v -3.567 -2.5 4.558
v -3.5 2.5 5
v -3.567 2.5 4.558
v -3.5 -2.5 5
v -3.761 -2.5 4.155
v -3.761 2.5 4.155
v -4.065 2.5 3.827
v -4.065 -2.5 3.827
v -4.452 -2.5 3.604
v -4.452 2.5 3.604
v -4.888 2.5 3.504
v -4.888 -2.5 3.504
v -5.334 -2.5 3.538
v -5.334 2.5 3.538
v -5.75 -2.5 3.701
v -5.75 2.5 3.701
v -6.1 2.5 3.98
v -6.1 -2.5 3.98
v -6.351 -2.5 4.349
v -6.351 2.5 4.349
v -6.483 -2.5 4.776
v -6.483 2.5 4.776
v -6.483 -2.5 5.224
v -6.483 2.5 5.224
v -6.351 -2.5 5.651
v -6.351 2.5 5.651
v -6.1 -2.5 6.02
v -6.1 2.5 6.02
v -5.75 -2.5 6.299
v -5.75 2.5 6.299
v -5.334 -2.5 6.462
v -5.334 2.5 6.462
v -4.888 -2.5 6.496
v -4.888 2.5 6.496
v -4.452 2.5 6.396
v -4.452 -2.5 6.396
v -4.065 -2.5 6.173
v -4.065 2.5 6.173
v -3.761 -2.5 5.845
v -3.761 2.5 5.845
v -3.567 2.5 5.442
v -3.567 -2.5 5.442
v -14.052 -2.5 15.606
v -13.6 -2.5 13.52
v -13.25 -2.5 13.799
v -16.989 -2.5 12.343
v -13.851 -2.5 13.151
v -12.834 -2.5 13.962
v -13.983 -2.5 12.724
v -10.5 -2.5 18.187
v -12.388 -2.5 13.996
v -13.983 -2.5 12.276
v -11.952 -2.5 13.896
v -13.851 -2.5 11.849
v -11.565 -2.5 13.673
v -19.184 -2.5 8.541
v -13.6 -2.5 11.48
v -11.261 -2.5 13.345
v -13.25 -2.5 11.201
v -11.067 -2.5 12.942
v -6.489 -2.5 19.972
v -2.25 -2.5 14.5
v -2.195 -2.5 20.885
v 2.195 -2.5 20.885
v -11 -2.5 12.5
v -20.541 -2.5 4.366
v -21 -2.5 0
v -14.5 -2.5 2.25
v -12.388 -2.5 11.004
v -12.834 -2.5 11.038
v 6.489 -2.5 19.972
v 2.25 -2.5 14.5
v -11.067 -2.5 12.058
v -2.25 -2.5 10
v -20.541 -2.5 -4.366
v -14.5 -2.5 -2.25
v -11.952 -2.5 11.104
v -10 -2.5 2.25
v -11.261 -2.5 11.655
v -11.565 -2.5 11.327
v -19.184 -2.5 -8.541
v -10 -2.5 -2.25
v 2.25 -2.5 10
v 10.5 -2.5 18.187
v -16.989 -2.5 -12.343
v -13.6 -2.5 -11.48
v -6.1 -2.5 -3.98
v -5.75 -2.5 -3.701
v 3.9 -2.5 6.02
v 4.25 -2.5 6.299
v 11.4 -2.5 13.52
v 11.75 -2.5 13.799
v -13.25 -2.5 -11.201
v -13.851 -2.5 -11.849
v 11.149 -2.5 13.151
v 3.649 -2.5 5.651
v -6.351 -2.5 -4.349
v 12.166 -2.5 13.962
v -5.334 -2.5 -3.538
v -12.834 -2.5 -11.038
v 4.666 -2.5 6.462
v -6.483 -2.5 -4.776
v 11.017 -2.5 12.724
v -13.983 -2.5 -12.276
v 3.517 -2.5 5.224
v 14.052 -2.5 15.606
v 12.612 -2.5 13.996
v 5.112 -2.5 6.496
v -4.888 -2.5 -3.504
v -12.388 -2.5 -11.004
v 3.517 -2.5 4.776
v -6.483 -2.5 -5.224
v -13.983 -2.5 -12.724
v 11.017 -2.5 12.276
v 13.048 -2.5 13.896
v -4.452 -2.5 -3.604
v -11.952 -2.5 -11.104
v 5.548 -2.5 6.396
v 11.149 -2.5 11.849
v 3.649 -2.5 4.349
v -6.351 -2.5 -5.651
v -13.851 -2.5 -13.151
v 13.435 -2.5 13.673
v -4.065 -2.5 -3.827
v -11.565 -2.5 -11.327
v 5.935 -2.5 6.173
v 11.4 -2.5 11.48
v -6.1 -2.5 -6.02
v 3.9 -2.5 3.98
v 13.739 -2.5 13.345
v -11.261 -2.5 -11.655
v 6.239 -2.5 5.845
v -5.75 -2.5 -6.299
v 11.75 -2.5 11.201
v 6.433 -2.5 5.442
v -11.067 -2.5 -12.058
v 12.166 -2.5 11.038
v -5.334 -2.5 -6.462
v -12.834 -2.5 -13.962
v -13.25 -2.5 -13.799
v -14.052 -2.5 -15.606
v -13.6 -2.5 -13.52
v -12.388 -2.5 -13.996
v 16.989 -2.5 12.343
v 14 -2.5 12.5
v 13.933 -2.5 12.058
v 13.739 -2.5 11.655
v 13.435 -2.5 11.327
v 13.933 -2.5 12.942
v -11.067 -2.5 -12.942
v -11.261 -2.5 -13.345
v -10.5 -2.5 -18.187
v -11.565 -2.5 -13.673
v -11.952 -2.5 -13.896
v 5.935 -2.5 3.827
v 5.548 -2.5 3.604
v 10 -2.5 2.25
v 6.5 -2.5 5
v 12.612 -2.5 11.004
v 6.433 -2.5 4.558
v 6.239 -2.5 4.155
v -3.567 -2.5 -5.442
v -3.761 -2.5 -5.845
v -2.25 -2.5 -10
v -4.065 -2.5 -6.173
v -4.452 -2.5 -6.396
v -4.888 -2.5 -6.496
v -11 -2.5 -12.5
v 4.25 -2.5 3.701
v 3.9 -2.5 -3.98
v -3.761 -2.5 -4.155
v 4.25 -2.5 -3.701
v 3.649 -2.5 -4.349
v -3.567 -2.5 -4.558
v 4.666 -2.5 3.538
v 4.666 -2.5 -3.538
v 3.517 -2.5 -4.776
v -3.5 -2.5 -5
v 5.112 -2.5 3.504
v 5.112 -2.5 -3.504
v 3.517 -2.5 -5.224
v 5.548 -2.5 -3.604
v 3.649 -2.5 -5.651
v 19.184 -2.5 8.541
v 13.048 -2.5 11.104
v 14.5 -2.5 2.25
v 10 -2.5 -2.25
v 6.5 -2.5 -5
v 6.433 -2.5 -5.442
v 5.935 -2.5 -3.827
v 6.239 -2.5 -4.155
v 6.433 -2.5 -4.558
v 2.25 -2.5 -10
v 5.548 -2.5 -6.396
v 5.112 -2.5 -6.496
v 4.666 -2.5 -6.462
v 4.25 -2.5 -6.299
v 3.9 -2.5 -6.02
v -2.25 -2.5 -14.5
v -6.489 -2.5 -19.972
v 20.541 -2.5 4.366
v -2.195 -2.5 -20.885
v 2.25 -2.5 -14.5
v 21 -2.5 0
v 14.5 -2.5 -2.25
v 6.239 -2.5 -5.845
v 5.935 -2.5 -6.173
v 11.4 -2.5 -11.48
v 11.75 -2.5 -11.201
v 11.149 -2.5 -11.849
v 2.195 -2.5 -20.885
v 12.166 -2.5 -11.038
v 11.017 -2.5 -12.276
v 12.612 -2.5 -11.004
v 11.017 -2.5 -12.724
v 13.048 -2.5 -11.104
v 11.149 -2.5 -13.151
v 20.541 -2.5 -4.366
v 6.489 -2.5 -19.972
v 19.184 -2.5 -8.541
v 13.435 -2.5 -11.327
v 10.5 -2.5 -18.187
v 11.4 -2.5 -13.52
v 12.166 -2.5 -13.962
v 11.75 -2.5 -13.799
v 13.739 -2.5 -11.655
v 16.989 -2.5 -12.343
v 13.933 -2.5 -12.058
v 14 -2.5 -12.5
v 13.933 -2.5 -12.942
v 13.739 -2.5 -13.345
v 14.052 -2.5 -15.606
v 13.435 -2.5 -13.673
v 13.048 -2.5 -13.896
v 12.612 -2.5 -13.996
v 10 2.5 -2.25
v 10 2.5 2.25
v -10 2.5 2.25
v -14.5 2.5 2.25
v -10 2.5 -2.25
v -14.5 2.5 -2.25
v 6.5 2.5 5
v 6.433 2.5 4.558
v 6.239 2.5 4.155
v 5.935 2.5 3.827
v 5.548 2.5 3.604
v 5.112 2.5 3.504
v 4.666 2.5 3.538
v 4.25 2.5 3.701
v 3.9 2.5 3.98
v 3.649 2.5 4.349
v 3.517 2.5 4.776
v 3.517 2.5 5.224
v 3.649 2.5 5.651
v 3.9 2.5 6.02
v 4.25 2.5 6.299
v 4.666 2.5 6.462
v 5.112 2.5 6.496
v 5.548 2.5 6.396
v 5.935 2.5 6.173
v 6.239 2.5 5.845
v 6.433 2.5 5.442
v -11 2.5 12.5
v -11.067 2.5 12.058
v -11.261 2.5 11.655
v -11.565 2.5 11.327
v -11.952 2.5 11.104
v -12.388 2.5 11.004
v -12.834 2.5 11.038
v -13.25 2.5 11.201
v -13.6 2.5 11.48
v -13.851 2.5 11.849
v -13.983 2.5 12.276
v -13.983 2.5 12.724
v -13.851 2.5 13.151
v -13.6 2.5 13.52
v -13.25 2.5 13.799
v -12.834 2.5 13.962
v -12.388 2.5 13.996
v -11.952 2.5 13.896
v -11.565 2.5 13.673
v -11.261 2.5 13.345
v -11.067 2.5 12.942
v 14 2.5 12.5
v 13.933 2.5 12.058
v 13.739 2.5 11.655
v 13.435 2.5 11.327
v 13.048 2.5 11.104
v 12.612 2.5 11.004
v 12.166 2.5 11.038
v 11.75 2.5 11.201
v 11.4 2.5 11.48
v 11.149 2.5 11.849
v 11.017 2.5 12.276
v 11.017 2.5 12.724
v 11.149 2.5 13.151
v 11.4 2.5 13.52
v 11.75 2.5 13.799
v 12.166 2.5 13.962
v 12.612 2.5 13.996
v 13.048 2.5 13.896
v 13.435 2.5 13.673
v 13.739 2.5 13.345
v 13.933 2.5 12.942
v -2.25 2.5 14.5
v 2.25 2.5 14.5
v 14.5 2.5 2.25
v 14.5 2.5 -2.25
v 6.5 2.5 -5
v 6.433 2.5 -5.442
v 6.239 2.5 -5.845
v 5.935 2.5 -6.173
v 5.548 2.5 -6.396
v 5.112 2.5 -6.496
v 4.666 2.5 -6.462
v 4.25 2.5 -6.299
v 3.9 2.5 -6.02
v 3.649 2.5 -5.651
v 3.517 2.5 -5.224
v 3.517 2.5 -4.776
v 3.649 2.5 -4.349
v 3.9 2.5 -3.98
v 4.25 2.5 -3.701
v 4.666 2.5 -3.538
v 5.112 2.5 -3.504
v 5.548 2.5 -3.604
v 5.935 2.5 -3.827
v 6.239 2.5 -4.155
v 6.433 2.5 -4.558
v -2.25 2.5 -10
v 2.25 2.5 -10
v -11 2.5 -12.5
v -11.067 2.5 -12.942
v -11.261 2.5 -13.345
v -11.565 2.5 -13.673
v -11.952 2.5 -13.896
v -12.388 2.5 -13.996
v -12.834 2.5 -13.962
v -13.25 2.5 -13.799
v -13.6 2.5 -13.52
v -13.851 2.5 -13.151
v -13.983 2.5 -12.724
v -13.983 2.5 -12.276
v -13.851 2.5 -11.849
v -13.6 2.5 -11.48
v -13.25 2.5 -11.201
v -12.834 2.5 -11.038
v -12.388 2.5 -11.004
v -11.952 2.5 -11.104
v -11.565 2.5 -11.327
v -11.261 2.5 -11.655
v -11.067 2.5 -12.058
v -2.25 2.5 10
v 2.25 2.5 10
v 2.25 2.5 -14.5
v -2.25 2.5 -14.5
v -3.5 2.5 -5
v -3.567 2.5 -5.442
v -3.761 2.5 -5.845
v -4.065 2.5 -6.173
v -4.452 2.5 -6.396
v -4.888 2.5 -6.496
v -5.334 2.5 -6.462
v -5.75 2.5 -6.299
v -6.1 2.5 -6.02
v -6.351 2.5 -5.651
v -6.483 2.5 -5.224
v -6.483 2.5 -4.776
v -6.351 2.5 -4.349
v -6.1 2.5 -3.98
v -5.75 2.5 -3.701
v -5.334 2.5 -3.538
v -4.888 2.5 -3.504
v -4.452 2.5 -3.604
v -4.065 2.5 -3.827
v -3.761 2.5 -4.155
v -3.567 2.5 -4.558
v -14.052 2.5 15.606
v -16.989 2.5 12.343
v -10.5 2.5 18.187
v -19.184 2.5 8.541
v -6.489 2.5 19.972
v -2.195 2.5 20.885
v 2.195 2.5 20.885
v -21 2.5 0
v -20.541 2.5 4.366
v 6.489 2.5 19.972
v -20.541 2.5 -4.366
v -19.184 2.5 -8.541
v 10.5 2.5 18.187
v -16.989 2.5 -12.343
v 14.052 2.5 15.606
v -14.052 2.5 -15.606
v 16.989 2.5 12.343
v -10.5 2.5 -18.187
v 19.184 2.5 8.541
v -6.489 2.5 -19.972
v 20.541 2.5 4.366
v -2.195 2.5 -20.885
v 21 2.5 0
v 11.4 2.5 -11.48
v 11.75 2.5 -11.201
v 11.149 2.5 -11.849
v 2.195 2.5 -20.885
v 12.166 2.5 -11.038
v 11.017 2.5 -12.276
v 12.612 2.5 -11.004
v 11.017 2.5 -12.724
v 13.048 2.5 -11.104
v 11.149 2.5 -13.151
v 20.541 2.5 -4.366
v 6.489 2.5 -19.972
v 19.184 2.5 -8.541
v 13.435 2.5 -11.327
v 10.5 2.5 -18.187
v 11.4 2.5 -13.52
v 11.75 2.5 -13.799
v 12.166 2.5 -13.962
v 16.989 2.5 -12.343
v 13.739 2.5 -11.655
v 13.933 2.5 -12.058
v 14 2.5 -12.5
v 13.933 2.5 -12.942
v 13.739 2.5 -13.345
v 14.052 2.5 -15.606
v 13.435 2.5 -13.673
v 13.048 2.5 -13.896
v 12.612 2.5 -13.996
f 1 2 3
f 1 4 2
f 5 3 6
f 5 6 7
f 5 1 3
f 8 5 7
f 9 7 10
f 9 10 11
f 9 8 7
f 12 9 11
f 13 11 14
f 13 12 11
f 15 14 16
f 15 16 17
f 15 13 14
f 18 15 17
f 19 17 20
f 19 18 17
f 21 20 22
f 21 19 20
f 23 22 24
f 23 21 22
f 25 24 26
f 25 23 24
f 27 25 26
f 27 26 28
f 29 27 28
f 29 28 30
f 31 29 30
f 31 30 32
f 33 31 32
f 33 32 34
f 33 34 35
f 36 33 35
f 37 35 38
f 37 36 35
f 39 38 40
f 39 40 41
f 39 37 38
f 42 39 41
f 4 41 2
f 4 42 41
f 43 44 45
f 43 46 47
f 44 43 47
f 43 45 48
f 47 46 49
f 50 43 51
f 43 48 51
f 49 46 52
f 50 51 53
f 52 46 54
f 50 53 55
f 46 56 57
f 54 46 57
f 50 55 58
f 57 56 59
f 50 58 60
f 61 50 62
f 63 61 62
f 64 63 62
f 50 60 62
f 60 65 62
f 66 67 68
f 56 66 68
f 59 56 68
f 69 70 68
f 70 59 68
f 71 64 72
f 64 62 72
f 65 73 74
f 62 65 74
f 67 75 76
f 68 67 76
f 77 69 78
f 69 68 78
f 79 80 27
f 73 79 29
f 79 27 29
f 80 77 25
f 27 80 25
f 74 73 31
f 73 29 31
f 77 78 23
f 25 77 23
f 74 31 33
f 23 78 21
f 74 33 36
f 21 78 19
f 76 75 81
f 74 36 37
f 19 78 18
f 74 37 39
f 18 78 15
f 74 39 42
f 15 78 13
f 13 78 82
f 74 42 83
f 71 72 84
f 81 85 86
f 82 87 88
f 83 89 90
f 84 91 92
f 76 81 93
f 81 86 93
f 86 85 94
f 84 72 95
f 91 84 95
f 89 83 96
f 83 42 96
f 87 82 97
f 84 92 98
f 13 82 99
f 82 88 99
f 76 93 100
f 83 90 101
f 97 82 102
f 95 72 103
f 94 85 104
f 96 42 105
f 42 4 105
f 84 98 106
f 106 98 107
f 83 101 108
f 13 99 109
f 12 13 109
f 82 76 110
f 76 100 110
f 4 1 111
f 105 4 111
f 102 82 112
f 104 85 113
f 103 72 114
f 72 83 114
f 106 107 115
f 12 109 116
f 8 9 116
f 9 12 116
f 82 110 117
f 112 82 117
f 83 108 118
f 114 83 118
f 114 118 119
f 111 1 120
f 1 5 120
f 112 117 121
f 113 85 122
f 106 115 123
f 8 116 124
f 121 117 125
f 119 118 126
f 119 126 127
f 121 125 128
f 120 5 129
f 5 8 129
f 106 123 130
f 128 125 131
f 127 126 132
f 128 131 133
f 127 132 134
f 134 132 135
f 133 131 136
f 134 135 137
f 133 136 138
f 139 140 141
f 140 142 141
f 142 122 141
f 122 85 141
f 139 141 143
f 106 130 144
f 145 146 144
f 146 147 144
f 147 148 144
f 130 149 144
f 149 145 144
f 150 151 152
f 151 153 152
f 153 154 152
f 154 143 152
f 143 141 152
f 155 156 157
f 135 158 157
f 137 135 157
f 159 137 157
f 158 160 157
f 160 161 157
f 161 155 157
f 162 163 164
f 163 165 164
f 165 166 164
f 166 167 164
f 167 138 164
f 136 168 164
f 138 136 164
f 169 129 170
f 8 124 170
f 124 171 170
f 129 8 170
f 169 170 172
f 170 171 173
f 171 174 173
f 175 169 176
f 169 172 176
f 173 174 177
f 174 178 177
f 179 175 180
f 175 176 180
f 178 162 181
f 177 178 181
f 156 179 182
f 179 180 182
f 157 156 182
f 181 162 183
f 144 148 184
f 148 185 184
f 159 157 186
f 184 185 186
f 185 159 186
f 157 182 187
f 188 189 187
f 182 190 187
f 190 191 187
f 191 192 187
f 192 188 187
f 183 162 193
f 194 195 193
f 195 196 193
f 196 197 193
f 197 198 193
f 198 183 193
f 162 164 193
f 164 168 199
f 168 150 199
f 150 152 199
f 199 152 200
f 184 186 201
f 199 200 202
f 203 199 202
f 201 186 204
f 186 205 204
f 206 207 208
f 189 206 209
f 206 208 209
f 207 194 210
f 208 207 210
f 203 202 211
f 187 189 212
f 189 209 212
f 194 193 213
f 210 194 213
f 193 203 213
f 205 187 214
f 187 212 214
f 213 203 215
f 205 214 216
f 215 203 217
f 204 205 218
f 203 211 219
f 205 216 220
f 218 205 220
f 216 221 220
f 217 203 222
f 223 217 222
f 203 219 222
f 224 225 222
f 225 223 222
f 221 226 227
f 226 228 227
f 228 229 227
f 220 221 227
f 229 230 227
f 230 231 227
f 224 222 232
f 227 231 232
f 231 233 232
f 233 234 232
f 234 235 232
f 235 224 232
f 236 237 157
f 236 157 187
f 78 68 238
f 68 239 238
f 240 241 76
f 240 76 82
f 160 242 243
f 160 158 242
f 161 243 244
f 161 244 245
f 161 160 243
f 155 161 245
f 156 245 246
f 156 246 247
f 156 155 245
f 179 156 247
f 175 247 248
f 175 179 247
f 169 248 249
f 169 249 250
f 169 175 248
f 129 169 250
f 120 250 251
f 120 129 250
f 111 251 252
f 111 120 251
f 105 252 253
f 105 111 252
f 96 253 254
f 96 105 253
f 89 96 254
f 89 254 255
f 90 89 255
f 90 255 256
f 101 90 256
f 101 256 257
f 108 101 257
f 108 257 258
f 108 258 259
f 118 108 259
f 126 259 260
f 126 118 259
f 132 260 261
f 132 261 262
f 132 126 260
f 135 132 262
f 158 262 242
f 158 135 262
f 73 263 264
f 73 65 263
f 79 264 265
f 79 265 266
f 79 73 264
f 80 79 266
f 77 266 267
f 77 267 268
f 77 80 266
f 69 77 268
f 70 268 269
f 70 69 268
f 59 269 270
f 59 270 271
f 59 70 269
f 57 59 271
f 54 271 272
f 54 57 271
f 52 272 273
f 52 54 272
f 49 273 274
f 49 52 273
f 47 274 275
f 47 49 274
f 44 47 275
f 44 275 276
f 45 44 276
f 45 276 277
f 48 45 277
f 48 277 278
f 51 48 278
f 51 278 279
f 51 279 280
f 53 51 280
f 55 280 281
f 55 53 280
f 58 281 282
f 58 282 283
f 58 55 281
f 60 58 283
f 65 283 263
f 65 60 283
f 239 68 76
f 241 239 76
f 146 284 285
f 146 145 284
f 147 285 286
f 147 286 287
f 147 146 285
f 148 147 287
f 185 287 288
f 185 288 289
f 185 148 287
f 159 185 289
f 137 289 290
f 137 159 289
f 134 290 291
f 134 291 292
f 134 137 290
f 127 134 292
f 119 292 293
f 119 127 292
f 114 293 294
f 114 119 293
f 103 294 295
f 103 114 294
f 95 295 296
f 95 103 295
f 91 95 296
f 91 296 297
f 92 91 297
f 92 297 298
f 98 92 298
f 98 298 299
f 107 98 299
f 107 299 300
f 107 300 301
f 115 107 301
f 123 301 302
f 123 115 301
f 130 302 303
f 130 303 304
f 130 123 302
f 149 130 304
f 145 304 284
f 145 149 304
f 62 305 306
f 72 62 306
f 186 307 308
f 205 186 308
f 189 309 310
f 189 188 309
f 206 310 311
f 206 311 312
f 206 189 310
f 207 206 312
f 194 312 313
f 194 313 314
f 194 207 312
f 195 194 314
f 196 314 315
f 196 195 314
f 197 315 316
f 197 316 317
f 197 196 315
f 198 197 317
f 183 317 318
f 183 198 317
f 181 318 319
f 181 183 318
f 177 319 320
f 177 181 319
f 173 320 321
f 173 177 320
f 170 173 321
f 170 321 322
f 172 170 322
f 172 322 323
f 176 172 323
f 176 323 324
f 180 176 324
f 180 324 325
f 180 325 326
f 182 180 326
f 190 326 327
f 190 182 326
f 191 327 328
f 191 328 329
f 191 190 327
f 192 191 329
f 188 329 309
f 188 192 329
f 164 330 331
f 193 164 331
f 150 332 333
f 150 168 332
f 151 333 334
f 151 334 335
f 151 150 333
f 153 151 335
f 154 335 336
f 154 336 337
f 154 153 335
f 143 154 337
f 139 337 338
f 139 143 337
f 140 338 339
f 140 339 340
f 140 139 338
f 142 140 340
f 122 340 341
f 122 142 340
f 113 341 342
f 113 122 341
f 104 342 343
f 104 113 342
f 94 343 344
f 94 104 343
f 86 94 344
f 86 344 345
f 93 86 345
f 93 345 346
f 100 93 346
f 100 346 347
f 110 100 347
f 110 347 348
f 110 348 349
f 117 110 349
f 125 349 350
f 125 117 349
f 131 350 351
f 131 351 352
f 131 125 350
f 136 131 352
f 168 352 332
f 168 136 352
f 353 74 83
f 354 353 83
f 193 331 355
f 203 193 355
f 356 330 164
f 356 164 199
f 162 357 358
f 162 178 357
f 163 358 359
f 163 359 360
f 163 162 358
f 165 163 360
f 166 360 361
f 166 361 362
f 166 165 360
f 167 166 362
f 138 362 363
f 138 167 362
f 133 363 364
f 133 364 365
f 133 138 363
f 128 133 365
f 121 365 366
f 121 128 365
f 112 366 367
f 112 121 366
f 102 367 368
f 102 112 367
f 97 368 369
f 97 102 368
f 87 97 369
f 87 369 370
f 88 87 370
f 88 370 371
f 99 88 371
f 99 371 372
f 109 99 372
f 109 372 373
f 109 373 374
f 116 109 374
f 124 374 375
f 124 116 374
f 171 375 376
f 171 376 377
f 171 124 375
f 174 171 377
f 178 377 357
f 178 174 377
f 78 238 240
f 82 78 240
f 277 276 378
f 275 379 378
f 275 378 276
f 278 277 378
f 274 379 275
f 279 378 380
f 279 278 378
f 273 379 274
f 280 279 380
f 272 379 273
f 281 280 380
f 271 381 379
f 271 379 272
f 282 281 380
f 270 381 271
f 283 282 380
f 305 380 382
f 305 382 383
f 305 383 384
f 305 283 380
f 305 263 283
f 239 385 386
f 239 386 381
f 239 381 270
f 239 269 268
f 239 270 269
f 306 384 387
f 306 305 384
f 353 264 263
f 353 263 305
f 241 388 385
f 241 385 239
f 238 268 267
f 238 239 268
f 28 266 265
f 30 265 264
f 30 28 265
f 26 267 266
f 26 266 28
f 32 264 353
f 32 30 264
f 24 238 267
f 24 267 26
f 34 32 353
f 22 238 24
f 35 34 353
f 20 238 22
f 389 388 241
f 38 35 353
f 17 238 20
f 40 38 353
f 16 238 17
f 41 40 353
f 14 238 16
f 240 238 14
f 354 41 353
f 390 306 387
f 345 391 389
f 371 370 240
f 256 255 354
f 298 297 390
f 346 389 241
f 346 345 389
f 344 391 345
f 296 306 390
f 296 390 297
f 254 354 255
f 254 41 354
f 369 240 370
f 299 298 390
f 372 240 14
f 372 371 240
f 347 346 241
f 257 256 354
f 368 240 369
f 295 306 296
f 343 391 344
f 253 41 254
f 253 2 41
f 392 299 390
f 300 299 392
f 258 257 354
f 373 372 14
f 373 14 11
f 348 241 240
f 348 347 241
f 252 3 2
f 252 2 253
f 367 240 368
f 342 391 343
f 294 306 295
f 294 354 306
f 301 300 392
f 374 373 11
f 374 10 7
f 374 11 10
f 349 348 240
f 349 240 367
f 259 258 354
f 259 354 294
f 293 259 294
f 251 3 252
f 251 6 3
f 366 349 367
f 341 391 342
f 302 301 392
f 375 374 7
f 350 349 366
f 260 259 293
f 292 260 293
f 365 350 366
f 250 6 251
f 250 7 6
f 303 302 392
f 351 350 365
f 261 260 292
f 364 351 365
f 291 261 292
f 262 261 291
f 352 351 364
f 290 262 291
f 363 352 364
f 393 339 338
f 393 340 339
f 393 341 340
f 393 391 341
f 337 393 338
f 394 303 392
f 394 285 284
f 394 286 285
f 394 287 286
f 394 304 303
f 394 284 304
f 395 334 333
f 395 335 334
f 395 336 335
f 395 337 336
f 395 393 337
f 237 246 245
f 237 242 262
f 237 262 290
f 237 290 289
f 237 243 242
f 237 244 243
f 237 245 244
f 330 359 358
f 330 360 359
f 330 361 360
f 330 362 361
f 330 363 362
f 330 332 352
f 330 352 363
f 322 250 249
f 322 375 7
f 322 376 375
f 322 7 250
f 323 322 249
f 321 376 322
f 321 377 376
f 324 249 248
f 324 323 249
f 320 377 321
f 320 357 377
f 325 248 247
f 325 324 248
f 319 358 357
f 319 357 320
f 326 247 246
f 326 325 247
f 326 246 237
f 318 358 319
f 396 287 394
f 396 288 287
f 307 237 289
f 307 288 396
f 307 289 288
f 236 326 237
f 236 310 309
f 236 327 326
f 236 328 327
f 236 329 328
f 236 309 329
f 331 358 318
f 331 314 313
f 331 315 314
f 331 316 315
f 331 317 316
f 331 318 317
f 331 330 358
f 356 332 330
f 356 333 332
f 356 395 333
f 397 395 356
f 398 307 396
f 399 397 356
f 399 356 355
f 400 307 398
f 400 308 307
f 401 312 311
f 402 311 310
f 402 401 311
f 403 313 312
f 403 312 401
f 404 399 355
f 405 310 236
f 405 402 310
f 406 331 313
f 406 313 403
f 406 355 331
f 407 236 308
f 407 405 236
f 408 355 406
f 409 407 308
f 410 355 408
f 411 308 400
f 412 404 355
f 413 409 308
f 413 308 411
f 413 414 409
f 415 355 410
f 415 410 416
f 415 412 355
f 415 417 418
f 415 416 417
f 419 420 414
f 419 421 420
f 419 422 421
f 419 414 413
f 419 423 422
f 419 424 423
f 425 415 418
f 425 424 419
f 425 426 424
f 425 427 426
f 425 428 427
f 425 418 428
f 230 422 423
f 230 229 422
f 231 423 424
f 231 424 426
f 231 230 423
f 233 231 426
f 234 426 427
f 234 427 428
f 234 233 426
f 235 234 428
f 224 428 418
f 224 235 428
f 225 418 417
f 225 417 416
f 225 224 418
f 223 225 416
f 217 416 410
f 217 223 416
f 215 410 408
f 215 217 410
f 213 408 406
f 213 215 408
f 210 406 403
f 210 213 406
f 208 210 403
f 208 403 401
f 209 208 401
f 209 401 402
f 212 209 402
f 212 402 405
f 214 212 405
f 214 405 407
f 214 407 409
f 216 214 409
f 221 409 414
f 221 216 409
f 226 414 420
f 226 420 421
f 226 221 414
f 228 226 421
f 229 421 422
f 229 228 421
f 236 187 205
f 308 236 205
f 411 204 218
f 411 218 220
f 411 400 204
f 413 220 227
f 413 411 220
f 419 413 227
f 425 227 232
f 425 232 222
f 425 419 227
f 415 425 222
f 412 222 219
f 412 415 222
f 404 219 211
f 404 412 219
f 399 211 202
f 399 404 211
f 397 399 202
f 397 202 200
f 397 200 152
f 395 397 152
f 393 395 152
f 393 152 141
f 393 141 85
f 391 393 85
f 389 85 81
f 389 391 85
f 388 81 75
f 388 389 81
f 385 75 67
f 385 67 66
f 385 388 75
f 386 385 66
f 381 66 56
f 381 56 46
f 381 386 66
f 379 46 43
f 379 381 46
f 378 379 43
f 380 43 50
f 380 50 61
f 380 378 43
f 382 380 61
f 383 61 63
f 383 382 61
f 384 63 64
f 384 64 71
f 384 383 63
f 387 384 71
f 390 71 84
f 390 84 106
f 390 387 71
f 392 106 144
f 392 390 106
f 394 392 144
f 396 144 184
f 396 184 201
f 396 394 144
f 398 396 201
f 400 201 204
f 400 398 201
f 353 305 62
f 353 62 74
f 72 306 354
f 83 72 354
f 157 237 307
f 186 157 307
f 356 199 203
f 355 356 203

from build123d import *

# Parameters (mm, degrees)
SKETCH1_R           = 21
SKETCH1_R_2         = 1.5
SKETCH1_W           = 4.5
SKETCH1_H           = 4.5
BOSS_EXTRUDE1_DEPTH = 2.5


with BuildPart() as part:
    # Sketch1 → Boss-Extrude1 (new body, symmetric)
    with BuildSketch(Plane(origin=(0, 0, 0), x_dir=(1, 0, 0), z_dir=(0, 1, 0))):
        Circle(SKETCH1_R)
        with Locations((5, 5)):
            Circle(SKETCH1_R_2, mode=Mode.SUBTRACT)
        with Locations((-5, 5)):
            Circle(SKETCH1_R_2, mode=Mode.SUBTRACT)
        with Locations((5, -5)):
            Circle(SKETCH1_R_2, mode=Mode.SUBTRACT)
        with Locations((-5, -5)):
            Circle(SKETCH1_R_2, mode=Mode.SUBTRACT)
        with Locations((-12.5, 12.5)):
            Circle(SKETCH1_R_2, mode=Mode.SUBTRACT)
        with Locations((12.5, 12.5)):
            Circle(SKETCH1_R_2, mode=Mode.SUBTRACT)
        with Locations((12.5, -12.5)):
            Circle(SKETCH1_R_2, mode=Mode.SUBTRACT)
        with Locations((-12.5, -12.5)):
            Circle(SKETCH1_R_2, mode=Mode.SUBTRACT)
        with Locations((12.25, 0)):
            Rectangle(SKETCH1_W, SKETCH1_H, mode=Mode.SUBTRACT)
        with Locations((0, -12.25)):
            Rectangle(SKETCH1_W, SKETCH1_H, mode=Mode.SUBTRACT)
        with Locations((0, 12.25)):
            Rectangle(SKETCH1_W, SKETCH1_H, mode=Mode.SUBTRACT)
        with Locations((-12.25, 0)):
            Rectangle(SKETCH1_W, SKETCH1_H, mode=Mode.SUBTRACT)
    extrude(amount=BOSS_EXTRUDE1_DEPTH, both=True)


solid = part.part
